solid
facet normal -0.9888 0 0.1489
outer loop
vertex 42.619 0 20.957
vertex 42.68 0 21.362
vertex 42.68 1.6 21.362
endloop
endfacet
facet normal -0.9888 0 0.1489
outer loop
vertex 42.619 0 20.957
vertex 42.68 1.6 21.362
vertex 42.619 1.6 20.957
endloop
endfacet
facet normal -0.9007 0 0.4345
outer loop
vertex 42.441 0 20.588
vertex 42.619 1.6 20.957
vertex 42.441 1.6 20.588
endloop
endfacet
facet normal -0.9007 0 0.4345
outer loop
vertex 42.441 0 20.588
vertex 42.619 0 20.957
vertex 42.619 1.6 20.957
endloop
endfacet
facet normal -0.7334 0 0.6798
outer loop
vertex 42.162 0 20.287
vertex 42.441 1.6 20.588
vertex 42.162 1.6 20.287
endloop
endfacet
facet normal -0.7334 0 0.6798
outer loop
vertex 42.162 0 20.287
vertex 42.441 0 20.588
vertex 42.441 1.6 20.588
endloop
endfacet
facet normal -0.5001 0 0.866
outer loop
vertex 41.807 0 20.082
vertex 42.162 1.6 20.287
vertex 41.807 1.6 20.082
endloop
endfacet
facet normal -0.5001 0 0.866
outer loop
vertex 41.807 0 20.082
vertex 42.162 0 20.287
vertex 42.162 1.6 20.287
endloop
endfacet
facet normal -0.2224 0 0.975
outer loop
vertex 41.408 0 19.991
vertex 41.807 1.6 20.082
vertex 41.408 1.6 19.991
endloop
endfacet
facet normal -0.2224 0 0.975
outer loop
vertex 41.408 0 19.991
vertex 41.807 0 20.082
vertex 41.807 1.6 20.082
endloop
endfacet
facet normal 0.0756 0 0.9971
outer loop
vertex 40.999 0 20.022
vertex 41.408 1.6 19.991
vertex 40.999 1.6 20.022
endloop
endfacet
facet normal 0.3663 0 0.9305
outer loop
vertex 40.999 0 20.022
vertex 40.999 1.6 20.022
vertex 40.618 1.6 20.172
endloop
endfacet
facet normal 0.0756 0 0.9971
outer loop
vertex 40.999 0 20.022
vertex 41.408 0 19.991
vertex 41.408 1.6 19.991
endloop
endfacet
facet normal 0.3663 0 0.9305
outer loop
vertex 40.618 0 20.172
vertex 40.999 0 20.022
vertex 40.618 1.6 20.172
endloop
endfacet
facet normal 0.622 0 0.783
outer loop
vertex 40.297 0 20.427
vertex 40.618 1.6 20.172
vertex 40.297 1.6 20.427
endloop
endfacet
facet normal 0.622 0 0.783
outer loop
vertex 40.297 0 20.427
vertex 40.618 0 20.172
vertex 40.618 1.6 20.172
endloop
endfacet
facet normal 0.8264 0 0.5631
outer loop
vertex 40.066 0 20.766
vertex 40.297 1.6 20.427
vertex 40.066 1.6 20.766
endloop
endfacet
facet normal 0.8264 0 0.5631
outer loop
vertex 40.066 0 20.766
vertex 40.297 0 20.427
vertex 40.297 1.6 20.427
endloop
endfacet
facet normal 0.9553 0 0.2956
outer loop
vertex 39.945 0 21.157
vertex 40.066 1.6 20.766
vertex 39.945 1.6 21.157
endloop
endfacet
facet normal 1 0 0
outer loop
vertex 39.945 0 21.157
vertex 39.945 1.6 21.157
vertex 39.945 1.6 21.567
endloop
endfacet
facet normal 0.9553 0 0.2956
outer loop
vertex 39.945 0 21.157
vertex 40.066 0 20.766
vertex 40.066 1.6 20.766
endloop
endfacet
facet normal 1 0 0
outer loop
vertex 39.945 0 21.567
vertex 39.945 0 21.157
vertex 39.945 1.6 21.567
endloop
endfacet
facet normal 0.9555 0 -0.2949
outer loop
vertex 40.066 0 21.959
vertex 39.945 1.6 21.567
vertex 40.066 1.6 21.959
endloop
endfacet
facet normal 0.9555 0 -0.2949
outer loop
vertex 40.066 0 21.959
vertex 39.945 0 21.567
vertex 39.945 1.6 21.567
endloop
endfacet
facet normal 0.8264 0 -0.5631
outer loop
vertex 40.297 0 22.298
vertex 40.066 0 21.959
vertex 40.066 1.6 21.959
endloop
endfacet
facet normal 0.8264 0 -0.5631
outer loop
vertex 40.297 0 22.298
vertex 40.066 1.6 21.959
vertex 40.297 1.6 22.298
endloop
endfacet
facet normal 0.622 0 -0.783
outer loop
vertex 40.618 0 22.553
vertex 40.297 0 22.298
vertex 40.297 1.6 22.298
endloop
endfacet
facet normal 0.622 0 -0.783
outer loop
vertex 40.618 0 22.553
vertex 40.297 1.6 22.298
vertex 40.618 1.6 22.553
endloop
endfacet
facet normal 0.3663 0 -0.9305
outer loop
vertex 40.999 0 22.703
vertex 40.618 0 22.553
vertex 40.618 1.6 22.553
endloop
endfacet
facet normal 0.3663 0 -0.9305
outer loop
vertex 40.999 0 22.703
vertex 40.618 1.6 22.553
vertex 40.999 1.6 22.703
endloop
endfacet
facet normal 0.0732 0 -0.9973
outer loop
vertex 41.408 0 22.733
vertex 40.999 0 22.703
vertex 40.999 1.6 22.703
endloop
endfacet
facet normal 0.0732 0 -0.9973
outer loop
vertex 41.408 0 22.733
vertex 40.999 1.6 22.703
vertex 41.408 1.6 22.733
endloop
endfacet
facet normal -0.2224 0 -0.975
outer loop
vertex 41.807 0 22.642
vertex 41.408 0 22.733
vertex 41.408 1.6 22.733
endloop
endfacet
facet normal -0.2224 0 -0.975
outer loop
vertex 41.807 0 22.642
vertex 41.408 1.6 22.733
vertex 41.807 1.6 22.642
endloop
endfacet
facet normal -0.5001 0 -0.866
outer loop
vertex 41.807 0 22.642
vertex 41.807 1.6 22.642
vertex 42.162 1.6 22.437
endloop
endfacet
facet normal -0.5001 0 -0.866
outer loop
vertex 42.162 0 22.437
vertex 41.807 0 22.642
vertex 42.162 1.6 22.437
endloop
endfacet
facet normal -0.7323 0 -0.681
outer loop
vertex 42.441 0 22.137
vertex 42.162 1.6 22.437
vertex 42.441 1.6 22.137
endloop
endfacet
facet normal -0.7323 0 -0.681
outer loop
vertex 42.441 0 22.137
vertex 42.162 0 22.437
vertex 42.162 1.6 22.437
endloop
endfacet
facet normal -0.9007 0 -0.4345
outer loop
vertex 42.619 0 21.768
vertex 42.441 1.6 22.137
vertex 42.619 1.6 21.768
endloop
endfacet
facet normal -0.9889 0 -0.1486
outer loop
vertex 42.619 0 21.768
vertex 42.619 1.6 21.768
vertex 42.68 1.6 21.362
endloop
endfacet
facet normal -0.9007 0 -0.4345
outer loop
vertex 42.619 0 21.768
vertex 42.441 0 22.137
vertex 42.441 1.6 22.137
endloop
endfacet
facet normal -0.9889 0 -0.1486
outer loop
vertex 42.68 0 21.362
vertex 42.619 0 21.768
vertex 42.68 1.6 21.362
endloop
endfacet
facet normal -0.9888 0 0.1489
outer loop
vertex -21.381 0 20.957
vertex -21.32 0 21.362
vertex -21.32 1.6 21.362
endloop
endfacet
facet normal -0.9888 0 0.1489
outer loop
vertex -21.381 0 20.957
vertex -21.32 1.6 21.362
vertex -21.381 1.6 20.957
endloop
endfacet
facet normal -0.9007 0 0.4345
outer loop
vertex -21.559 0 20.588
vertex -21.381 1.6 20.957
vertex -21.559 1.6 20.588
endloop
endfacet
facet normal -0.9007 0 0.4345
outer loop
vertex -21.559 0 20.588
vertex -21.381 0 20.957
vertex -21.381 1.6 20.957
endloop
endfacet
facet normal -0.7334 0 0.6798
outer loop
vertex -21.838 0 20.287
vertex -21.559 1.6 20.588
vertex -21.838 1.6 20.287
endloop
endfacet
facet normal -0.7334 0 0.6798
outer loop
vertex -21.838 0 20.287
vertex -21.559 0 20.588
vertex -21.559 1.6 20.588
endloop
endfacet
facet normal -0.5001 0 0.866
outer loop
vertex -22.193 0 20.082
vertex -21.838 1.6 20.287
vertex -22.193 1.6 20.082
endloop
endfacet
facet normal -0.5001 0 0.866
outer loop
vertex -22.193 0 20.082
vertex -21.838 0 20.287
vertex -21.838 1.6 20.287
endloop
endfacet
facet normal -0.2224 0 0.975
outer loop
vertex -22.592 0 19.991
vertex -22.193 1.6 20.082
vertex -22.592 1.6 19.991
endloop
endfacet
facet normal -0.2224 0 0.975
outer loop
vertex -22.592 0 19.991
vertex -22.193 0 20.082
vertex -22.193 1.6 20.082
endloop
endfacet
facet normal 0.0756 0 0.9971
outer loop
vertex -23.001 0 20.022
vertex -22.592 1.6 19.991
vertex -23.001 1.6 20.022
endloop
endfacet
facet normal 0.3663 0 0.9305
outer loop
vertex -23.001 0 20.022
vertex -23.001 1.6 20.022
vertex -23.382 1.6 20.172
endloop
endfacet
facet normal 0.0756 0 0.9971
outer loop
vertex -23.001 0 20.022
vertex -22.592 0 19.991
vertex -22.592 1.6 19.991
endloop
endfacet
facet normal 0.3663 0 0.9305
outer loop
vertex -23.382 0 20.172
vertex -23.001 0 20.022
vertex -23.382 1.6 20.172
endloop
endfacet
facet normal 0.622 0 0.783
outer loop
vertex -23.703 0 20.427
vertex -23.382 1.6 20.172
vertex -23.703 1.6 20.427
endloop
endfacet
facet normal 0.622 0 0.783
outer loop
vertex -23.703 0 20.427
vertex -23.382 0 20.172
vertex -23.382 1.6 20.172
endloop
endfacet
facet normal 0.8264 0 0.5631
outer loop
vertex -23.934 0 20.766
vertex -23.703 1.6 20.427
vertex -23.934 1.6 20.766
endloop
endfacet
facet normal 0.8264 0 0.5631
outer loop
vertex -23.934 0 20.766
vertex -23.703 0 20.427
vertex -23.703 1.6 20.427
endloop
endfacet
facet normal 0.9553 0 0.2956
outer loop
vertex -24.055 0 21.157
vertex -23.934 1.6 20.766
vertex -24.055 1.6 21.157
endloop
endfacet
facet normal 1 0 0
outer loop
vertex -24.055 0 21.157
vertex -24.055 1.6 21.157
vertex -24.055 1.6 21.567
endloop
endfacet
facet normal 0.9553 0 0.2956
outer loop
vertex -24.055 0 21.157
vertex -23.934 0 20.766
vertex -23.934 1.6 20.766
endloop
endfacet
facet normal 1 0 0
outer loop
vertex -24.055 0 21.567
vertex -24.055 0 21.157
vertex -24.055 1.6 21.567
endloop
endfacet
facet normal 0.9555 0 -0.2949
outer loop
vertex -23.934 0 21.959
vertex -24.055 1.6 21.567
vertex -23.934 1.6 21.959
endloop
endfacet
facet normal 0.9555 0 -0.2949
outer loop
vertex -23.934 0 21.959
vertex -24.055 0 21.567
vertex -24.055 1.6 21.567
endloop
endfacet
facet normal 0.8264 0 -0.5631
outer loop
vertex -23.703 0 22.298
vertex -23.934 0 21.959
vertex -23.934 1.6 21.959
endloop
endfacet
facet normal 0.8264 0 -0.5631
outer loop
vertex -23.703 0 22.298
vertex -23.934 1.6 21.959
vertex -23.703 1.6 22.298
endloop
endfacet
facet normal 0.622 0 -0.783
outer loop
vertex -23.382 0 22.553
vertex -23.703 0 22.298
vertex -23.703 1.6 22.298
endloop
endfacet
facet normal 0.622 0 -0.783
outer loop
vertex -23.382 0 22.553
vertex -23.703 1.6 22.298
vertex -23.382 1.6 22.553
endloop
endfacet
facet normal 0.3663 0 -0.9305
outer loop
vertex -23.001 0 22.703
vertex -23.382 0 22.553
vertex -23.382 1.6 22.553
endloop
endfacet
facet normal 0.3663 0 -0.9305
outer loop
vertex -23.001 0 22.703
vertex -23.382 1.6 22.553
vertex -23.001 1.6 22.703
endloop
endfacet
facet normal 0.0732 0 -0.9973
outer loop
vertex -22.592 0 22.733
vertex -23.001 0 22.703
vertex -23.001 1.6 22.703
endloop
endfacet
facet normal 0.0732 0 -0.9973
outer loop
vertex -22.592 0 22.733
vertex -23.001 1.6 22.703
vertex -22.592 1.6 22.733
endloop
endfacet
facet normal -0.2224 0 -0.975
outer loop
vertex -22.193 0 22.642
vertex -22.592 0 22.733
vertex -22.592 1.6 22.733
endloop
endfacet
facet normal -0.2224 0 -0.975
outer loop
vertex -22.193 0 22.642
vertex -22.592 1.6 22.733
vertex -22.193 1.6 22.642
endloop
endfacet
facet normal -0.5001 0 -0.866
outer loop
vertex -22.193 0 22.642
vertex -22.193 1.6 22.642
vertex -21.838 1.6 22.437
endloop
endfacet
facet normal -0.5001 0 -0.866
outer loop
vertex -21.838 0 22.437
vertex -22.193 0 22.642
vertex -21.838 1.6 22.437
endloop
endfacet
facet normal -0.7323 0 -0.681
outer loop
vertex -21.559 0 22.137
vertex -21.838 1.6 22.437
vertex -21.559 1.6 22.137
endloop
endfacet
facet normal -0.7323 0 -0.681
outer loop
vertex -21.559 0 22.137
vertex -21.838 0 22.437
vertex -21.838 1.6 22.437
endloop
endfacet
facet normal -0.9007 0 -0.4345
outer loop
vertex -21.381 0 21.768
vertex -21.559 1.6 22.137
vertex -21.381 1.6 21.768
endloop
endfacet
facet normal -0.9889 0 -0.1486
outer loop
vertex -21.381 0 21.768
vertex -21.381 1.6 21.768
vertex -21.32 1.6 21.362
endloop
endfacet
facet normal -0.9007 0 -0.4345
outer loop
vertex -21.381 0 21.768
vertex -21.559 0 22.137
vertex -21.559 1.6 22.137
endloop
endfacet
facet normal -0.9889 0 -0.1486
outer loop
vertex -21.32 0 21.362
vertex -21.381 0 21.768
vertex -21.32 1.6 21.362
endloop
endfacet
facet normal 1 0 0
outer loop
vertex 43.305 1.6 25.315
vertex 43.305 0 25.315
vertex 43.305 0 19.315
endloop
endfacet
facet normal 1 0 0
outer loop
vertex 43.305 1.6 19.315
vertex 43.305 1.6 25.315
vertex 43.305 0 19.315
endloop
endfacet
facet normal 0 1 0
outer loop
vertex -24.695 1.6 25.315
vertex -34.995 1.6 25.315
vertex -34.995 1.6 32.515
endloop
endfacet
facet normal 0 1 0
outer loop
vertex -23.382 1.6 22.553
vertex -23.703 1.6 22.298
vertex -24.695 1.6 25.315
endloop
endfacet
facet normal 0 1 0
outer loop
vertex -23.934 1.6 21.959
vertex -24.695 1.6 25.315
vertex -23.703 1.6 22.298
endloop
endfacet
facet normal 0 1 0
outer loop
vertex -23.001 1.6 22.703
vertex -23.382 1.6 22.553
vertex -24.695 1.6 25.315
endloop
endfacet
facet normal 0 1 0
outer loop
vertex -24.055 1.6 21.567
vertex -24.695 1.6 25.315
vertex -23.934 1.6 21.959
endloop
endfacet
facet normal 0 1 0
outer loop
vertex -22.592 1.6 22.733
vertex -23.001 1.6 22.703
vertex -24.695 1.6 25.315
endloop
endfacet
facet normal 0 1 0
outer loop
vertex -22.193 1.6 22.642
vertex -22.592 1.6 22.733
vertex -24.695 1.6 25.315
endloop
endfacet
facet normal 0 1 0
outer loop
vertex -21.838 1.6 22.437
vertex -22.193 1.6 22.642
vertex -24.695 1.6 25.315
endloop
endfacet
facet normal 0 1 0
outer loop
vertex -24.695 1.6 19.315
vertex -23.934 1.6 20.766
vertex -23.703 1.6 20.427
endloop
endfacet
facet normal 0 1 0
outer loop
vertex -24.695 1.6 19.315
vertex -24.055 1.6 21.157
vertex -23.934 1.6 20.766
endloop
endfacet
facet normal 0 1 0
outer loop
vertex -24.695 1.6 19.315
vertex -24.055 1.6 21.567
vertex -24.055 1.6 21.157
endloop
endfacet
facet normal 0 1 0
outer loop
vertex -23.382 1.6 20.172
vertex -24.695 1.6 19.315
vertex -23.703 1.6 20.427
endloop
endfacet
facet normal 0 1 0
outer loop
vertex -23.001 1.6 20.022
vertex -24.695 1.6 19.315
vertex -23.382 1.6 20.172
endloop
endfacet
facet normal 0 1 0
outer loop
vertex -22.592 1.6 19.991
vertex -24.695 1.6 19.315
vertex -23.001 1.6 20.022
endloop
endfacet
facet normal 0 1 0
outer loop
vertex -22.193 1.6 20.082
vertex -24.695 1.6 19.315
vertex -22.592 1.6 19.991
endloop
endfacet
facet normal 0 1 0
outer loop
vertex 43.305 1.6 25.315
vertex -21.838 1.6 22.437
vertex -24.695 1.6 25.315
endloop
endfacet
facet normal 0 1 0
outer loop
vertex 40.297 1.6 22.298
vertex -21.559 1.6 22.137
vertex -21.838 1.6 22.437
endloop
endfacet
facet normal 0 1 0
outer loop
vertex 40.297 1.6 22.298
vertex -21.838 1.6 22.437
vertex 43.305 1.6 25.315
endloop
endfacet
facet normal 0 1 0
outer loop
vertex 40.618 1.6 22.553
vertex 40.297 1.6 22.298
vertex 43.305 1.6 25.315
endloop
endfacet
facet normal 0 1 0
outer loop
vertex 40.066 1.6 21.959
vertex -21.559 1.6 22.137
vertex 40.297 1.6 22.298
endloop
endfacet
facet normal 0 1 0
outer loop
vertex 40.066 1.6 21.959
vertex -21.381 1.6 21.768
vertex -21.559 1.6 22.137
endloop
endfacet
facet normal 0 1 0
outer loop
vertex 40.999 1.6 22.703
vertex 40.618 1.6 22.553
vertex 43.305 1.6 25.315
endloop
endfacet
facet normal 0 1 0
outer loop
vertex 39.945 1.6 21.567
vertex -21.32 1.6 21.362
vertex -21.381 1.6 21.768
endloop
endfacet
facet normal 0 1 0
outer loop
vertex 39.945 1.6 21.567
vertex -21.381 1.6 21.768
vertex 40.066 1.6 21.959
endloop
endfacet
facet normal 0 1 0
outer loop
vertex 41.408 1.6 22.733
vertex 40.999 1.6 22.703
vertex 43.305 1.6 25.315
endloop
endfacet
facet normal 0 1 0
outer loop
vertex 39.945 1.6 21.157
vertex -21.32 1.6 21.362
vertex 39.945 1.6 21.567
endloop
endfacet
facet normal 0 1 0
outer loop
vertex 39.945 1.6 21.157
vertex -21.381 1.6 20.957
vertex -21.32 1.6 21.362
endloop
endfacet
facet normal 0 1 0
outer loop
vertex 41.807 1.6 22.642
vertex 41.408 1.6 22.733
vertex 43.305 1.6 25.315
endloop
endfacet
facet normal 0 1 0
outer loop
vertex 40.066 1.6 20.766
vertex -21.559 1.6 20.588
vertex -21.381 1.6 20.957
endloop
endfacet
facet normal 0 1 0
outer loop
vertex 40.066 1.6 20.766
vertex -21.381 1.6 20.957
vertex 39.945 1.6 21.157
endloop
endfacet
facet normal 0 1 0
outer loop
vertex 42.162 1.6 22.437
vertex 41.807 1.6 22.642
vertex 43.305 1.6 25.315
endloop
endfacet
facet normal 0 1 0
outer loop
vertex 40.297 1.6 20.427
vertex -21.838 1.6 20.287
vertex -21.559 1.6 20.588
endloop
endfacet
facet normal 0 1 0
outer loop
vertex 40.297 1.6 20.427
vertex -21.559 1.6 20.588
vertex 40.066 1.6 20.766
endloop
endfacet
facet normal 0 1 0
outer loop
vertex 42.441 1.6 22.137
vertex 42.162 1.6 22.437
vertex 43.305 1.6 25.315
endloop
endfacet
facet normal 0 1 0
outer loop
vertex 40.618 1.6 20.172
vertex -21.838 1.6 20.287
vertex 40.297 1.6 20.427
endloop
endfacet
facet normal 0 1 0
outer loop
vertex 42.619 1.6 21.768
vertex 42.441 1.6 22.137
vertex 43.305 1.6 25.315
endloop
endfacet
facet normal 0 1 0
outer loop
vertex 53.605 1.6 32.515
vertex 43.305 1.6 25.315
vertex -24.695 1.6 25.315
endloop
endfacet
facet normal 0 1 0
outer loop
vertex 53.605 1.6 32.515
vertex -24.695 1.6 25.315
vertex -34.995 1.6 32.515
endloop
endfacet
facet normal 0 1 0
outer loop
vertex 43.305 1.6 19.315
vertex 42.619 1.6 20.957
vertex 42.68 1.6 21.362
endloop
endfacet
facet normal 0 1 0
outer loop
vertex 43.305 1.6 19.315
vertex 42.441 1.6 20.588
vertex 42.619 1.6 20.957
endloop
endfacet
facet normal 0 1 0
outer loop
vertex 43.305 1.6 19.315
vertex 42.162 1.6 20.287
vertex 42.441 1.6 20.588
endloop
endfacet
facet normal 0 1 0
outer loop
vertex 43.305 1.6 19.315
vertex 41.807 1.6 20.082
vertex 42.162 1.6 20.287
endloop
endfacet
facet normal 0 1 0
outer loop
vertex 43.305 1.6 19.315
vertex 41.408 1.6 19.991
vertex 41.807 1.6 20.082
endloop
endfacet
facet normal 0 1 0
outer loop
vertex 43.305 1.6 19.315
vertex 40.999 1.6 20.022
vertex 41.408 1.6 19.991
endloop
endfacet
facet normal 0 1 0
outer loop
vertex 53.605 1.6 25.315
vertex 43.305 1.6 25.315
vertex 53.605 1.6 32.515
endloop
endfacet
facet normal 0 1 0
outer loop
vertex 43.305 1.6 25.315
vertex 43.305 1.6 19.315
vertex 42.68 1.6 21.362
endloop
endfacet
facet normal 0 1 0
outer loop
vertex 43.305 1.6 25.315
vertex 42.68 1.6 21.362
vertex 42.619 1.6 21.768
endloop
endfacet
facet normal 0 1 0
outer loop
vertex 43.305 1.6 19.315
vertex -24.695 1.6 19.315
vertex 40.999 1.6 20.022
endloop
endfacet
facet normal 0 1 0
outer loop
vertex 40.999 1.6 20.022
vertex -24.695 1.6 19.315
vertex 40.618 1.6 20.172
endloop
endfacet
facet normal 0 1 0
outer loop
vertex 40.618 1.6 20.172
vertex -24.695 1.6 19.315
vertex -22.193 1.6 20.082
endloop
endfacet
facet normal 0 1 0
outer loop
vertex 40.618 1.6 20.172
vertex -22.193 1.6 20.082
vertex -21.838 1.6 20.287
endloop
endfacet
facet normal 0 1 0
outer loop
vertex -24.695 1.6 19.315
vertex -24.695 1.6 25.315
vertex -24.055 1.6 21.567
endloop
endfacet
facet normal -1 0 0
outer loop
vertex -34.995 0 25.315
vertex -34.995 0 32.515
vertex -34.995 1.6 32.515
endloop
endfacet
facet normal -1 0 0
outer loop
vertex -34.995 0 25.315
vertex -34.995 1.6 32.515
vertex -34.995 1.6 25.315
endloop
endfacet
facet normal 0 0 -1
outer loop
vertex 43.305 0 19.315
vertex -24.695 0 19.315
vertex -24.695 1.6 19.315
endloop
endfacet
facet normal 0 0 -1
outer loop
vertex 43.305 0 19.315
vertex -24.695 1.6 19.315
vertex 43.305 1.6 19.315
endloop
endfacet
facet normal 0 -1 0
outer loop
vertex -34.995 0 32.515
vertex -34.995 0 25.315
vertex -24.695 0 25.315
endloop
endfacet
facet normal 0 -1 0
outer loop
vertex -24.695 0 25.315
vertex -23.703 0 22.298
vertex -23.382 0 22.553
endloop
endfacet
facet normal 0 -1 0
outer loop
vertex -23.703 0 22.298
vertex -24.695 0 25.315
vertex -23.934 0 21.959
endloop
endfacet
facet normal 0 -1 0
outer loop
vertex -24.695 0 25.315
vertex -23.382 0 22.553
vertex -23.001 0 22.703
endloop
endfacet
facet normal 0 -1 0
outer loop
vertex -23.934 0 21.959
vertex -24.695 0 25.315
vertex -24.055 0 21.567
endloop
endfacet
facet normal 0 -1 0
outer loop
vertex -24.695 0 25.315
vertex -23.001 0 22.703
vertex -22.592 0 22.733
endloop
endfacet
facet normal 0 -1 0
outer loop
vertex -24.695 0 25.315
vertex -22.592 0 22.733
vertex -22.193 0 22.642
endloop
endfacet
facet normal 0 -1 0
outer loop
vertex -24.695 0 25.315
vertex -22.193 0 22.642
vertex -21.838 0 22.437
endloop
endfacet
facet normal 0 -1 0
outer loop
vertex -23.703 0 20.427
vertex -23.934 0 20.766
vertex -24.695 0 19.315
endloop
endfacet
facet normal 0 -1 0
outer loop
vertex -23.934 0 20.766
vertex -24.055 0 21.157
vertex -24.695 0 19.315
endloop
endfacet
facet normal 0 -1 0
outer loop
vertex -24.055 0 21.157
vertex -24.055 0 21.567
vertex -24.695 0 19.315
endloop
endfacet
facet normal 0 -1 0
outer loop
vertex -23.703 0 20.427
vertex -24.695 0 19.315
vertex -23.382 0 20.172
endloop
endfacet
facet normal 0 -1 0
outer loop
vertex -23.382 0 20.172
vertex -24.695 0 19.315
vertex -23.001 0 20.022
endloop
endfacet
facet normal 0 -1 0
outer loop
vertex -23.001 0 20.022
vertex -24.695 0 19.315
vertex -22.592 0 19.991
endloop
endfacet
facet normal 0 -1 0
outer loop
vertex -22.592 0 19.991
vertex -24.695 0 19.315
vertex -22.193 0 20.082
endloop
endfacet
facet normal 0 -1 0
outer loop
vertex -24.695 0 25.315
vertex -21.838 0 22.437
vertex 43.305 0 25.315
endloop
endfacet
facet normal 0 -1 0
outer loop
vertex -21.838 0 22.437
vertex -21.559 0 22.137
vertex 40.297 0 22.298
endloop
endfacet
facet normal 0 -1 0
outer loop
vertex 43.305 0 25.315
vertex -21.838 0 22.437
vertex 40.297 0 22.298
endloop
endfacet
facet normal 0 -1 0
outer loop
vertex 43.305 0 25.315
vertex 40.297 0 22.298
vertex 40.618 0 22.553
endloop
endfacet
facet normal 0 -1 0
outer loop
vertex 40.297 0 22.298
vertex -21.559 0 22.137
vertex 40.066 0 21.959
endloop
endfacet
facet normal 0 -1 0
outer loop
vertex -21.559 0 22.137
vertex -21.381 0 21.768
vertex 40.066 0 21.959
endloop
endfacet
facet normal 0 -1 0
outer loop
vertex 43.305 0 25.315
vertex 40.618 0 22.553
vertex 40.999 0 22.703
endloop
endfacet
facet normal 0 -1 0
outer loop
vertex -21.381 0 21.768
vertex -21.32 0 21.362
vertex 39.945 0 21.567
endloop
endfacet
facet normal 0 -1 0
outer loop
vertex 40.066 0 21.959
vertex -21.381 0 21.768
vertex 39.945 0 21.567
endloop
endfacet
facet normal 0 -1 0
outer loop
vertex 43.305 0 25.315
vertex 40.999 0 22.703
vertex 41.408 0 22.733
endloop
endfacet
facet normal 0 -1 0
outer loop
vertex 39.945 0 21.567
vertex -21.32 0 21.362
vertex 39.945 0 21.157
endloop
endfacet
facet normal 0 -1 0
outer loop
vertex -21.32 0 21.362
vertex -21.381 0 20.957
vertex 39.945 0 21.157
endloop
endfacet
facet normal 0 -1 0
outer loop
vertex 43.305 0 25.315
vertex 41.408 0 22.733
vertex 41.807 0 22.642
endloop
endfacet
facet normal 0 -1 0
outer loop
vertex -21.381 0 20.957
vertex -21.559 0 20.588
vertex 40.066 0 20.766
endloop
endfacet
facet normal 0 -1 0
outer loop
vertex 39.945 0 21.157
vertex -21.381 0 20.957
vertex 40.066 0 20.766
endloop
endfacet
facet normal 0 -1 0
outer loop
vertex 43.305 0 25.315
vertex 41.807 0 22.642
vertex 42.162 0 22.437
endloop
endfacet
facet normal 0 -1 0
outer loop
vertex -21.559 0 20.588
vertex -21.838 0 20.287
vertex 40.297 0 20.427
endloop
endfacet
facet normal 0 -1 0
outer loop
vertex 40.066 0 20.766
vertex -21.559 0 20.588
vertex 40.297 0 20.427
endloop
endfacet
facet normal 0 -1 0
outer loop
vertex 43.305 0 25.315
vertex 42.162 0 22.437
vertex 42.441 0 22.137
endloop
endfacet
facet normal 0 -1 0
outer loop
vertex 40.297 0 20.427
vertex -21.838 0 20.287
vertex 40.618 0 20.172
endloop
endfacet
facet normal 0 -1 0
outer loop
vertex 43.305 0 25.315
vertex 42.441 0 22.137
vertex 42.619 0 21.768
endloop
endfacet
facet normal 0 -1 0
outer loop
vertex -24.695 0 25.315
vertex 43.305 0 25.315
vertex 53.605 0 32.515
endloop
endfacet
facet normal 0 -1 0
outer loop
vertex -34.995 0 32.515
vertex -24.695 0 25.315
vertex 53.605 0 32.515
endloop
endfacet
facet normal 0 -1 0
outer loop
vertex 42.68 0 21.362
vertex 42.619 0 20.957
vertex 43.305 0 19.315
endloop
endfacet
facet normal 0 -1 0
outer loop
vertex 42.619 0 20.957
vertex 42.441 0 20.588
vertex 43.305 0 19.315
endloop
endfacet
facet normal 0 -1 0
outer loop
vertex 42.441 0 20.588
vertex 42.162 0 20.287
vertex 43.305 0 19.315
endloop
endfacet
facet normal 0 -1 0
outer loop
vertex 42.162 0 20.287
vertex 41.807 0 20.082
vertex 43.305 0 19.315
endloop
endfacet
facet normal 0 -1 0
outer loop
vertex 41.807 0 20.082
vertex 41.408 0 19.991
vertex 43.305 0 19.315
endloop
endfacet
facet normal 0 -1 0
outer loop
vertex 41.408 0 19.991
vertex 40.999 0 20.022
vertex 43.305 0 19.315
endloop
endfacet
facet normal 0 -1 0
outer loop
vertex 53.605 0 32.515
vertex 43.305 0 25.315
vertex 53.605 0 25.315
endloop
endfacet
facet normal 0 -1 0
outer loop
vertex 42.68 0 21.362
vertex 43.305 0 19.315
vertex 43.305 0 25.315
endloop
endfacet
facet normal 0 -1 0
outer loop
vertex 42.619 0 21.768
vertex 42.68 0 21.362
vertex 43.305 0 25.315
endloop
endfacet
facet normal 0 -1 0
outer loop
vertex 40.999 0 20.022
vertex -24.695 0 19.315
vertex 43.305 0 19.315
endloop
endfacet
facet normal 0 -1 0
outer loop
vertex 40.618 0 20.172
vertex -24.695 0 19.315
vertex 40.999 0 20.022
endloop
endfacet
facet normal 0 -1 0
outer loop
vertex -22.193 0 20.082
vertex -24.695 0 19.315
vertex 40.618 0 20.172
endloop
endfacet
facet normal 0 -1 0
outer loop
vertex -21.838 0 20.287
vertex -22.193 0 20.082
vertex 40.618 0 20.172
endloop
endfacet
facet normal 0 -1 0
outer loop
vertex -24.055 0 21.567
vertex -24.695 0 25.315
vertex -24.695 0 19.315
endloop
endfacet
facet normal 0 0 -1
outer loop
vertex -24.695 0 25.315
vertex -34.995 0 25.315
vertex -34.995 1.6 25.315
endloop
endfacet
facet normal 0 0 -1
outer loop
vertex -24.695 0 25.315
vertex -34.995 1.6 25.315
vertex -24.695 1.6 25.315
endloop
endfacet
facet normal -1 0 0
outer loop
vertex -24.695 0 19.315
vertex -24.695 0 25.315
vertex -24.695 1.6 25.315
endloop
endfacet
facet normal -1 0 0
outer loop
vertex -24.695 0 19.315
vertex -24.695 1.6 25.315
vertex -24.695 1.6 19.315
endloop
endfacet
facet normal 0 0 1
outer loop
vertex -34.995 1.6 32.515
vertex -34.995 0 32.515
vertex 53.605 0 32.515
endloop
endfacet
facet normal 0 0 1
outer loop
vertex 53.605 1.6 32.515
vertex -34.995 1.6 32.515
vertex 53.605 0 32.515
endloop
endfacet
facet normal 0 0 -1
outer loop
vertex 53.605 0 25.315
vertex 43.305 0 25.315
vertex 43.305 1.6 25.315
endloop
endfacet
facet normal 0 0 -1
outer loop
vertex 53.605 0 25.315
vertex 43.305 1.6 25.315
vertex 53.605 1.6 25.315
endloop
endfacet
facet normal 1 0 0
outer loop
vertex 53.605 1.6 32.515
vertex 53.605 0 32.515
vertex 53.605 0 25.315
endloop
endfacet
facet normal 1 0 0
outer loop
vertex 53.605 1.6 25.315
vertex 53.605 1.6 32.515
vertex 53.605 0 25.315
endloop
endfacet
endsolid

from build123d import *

# Parameters (mm, degrees)
SKETCH1_W           = 88.6
SKETCH1_H           = 7.2
SKETCH1_W_2         = 68
SKETCH1_H_2         = 6
SKETCH1_R           = 1.375
BOSS_EXTRUDE1_DEPTH = 1.6


with BuildPart() as part:
    # Sketch1 → Boss-Extrude1 (new body)
    with BuildSketch(Plane(origin=(0, 0, 0), x_dir=(1, 0, 0), z_dir=(0, 1, 0))):
        with Locations((9.305038693, -28.915060123)):
            Rectangle(SKETCH1_W, SKETCH1_H)
        with Locations((9.305038693, -22.315060123)):
            Rectangle(SKETCH1_W_2, SKETCH1_H_2)
        with Locations((-22.694961307, -21.362291366)):
            Circle(SKETCH1_R, mode=Mode.SUBTRACT)
        with Locations((41.305038693, -21.362291366)):
            Circle(SKETCH1_R, mode=Mode.SUBTRACT)
    extrude(amount=BOSS_EXTRUDE1_DEPTH)


solid = part.part
